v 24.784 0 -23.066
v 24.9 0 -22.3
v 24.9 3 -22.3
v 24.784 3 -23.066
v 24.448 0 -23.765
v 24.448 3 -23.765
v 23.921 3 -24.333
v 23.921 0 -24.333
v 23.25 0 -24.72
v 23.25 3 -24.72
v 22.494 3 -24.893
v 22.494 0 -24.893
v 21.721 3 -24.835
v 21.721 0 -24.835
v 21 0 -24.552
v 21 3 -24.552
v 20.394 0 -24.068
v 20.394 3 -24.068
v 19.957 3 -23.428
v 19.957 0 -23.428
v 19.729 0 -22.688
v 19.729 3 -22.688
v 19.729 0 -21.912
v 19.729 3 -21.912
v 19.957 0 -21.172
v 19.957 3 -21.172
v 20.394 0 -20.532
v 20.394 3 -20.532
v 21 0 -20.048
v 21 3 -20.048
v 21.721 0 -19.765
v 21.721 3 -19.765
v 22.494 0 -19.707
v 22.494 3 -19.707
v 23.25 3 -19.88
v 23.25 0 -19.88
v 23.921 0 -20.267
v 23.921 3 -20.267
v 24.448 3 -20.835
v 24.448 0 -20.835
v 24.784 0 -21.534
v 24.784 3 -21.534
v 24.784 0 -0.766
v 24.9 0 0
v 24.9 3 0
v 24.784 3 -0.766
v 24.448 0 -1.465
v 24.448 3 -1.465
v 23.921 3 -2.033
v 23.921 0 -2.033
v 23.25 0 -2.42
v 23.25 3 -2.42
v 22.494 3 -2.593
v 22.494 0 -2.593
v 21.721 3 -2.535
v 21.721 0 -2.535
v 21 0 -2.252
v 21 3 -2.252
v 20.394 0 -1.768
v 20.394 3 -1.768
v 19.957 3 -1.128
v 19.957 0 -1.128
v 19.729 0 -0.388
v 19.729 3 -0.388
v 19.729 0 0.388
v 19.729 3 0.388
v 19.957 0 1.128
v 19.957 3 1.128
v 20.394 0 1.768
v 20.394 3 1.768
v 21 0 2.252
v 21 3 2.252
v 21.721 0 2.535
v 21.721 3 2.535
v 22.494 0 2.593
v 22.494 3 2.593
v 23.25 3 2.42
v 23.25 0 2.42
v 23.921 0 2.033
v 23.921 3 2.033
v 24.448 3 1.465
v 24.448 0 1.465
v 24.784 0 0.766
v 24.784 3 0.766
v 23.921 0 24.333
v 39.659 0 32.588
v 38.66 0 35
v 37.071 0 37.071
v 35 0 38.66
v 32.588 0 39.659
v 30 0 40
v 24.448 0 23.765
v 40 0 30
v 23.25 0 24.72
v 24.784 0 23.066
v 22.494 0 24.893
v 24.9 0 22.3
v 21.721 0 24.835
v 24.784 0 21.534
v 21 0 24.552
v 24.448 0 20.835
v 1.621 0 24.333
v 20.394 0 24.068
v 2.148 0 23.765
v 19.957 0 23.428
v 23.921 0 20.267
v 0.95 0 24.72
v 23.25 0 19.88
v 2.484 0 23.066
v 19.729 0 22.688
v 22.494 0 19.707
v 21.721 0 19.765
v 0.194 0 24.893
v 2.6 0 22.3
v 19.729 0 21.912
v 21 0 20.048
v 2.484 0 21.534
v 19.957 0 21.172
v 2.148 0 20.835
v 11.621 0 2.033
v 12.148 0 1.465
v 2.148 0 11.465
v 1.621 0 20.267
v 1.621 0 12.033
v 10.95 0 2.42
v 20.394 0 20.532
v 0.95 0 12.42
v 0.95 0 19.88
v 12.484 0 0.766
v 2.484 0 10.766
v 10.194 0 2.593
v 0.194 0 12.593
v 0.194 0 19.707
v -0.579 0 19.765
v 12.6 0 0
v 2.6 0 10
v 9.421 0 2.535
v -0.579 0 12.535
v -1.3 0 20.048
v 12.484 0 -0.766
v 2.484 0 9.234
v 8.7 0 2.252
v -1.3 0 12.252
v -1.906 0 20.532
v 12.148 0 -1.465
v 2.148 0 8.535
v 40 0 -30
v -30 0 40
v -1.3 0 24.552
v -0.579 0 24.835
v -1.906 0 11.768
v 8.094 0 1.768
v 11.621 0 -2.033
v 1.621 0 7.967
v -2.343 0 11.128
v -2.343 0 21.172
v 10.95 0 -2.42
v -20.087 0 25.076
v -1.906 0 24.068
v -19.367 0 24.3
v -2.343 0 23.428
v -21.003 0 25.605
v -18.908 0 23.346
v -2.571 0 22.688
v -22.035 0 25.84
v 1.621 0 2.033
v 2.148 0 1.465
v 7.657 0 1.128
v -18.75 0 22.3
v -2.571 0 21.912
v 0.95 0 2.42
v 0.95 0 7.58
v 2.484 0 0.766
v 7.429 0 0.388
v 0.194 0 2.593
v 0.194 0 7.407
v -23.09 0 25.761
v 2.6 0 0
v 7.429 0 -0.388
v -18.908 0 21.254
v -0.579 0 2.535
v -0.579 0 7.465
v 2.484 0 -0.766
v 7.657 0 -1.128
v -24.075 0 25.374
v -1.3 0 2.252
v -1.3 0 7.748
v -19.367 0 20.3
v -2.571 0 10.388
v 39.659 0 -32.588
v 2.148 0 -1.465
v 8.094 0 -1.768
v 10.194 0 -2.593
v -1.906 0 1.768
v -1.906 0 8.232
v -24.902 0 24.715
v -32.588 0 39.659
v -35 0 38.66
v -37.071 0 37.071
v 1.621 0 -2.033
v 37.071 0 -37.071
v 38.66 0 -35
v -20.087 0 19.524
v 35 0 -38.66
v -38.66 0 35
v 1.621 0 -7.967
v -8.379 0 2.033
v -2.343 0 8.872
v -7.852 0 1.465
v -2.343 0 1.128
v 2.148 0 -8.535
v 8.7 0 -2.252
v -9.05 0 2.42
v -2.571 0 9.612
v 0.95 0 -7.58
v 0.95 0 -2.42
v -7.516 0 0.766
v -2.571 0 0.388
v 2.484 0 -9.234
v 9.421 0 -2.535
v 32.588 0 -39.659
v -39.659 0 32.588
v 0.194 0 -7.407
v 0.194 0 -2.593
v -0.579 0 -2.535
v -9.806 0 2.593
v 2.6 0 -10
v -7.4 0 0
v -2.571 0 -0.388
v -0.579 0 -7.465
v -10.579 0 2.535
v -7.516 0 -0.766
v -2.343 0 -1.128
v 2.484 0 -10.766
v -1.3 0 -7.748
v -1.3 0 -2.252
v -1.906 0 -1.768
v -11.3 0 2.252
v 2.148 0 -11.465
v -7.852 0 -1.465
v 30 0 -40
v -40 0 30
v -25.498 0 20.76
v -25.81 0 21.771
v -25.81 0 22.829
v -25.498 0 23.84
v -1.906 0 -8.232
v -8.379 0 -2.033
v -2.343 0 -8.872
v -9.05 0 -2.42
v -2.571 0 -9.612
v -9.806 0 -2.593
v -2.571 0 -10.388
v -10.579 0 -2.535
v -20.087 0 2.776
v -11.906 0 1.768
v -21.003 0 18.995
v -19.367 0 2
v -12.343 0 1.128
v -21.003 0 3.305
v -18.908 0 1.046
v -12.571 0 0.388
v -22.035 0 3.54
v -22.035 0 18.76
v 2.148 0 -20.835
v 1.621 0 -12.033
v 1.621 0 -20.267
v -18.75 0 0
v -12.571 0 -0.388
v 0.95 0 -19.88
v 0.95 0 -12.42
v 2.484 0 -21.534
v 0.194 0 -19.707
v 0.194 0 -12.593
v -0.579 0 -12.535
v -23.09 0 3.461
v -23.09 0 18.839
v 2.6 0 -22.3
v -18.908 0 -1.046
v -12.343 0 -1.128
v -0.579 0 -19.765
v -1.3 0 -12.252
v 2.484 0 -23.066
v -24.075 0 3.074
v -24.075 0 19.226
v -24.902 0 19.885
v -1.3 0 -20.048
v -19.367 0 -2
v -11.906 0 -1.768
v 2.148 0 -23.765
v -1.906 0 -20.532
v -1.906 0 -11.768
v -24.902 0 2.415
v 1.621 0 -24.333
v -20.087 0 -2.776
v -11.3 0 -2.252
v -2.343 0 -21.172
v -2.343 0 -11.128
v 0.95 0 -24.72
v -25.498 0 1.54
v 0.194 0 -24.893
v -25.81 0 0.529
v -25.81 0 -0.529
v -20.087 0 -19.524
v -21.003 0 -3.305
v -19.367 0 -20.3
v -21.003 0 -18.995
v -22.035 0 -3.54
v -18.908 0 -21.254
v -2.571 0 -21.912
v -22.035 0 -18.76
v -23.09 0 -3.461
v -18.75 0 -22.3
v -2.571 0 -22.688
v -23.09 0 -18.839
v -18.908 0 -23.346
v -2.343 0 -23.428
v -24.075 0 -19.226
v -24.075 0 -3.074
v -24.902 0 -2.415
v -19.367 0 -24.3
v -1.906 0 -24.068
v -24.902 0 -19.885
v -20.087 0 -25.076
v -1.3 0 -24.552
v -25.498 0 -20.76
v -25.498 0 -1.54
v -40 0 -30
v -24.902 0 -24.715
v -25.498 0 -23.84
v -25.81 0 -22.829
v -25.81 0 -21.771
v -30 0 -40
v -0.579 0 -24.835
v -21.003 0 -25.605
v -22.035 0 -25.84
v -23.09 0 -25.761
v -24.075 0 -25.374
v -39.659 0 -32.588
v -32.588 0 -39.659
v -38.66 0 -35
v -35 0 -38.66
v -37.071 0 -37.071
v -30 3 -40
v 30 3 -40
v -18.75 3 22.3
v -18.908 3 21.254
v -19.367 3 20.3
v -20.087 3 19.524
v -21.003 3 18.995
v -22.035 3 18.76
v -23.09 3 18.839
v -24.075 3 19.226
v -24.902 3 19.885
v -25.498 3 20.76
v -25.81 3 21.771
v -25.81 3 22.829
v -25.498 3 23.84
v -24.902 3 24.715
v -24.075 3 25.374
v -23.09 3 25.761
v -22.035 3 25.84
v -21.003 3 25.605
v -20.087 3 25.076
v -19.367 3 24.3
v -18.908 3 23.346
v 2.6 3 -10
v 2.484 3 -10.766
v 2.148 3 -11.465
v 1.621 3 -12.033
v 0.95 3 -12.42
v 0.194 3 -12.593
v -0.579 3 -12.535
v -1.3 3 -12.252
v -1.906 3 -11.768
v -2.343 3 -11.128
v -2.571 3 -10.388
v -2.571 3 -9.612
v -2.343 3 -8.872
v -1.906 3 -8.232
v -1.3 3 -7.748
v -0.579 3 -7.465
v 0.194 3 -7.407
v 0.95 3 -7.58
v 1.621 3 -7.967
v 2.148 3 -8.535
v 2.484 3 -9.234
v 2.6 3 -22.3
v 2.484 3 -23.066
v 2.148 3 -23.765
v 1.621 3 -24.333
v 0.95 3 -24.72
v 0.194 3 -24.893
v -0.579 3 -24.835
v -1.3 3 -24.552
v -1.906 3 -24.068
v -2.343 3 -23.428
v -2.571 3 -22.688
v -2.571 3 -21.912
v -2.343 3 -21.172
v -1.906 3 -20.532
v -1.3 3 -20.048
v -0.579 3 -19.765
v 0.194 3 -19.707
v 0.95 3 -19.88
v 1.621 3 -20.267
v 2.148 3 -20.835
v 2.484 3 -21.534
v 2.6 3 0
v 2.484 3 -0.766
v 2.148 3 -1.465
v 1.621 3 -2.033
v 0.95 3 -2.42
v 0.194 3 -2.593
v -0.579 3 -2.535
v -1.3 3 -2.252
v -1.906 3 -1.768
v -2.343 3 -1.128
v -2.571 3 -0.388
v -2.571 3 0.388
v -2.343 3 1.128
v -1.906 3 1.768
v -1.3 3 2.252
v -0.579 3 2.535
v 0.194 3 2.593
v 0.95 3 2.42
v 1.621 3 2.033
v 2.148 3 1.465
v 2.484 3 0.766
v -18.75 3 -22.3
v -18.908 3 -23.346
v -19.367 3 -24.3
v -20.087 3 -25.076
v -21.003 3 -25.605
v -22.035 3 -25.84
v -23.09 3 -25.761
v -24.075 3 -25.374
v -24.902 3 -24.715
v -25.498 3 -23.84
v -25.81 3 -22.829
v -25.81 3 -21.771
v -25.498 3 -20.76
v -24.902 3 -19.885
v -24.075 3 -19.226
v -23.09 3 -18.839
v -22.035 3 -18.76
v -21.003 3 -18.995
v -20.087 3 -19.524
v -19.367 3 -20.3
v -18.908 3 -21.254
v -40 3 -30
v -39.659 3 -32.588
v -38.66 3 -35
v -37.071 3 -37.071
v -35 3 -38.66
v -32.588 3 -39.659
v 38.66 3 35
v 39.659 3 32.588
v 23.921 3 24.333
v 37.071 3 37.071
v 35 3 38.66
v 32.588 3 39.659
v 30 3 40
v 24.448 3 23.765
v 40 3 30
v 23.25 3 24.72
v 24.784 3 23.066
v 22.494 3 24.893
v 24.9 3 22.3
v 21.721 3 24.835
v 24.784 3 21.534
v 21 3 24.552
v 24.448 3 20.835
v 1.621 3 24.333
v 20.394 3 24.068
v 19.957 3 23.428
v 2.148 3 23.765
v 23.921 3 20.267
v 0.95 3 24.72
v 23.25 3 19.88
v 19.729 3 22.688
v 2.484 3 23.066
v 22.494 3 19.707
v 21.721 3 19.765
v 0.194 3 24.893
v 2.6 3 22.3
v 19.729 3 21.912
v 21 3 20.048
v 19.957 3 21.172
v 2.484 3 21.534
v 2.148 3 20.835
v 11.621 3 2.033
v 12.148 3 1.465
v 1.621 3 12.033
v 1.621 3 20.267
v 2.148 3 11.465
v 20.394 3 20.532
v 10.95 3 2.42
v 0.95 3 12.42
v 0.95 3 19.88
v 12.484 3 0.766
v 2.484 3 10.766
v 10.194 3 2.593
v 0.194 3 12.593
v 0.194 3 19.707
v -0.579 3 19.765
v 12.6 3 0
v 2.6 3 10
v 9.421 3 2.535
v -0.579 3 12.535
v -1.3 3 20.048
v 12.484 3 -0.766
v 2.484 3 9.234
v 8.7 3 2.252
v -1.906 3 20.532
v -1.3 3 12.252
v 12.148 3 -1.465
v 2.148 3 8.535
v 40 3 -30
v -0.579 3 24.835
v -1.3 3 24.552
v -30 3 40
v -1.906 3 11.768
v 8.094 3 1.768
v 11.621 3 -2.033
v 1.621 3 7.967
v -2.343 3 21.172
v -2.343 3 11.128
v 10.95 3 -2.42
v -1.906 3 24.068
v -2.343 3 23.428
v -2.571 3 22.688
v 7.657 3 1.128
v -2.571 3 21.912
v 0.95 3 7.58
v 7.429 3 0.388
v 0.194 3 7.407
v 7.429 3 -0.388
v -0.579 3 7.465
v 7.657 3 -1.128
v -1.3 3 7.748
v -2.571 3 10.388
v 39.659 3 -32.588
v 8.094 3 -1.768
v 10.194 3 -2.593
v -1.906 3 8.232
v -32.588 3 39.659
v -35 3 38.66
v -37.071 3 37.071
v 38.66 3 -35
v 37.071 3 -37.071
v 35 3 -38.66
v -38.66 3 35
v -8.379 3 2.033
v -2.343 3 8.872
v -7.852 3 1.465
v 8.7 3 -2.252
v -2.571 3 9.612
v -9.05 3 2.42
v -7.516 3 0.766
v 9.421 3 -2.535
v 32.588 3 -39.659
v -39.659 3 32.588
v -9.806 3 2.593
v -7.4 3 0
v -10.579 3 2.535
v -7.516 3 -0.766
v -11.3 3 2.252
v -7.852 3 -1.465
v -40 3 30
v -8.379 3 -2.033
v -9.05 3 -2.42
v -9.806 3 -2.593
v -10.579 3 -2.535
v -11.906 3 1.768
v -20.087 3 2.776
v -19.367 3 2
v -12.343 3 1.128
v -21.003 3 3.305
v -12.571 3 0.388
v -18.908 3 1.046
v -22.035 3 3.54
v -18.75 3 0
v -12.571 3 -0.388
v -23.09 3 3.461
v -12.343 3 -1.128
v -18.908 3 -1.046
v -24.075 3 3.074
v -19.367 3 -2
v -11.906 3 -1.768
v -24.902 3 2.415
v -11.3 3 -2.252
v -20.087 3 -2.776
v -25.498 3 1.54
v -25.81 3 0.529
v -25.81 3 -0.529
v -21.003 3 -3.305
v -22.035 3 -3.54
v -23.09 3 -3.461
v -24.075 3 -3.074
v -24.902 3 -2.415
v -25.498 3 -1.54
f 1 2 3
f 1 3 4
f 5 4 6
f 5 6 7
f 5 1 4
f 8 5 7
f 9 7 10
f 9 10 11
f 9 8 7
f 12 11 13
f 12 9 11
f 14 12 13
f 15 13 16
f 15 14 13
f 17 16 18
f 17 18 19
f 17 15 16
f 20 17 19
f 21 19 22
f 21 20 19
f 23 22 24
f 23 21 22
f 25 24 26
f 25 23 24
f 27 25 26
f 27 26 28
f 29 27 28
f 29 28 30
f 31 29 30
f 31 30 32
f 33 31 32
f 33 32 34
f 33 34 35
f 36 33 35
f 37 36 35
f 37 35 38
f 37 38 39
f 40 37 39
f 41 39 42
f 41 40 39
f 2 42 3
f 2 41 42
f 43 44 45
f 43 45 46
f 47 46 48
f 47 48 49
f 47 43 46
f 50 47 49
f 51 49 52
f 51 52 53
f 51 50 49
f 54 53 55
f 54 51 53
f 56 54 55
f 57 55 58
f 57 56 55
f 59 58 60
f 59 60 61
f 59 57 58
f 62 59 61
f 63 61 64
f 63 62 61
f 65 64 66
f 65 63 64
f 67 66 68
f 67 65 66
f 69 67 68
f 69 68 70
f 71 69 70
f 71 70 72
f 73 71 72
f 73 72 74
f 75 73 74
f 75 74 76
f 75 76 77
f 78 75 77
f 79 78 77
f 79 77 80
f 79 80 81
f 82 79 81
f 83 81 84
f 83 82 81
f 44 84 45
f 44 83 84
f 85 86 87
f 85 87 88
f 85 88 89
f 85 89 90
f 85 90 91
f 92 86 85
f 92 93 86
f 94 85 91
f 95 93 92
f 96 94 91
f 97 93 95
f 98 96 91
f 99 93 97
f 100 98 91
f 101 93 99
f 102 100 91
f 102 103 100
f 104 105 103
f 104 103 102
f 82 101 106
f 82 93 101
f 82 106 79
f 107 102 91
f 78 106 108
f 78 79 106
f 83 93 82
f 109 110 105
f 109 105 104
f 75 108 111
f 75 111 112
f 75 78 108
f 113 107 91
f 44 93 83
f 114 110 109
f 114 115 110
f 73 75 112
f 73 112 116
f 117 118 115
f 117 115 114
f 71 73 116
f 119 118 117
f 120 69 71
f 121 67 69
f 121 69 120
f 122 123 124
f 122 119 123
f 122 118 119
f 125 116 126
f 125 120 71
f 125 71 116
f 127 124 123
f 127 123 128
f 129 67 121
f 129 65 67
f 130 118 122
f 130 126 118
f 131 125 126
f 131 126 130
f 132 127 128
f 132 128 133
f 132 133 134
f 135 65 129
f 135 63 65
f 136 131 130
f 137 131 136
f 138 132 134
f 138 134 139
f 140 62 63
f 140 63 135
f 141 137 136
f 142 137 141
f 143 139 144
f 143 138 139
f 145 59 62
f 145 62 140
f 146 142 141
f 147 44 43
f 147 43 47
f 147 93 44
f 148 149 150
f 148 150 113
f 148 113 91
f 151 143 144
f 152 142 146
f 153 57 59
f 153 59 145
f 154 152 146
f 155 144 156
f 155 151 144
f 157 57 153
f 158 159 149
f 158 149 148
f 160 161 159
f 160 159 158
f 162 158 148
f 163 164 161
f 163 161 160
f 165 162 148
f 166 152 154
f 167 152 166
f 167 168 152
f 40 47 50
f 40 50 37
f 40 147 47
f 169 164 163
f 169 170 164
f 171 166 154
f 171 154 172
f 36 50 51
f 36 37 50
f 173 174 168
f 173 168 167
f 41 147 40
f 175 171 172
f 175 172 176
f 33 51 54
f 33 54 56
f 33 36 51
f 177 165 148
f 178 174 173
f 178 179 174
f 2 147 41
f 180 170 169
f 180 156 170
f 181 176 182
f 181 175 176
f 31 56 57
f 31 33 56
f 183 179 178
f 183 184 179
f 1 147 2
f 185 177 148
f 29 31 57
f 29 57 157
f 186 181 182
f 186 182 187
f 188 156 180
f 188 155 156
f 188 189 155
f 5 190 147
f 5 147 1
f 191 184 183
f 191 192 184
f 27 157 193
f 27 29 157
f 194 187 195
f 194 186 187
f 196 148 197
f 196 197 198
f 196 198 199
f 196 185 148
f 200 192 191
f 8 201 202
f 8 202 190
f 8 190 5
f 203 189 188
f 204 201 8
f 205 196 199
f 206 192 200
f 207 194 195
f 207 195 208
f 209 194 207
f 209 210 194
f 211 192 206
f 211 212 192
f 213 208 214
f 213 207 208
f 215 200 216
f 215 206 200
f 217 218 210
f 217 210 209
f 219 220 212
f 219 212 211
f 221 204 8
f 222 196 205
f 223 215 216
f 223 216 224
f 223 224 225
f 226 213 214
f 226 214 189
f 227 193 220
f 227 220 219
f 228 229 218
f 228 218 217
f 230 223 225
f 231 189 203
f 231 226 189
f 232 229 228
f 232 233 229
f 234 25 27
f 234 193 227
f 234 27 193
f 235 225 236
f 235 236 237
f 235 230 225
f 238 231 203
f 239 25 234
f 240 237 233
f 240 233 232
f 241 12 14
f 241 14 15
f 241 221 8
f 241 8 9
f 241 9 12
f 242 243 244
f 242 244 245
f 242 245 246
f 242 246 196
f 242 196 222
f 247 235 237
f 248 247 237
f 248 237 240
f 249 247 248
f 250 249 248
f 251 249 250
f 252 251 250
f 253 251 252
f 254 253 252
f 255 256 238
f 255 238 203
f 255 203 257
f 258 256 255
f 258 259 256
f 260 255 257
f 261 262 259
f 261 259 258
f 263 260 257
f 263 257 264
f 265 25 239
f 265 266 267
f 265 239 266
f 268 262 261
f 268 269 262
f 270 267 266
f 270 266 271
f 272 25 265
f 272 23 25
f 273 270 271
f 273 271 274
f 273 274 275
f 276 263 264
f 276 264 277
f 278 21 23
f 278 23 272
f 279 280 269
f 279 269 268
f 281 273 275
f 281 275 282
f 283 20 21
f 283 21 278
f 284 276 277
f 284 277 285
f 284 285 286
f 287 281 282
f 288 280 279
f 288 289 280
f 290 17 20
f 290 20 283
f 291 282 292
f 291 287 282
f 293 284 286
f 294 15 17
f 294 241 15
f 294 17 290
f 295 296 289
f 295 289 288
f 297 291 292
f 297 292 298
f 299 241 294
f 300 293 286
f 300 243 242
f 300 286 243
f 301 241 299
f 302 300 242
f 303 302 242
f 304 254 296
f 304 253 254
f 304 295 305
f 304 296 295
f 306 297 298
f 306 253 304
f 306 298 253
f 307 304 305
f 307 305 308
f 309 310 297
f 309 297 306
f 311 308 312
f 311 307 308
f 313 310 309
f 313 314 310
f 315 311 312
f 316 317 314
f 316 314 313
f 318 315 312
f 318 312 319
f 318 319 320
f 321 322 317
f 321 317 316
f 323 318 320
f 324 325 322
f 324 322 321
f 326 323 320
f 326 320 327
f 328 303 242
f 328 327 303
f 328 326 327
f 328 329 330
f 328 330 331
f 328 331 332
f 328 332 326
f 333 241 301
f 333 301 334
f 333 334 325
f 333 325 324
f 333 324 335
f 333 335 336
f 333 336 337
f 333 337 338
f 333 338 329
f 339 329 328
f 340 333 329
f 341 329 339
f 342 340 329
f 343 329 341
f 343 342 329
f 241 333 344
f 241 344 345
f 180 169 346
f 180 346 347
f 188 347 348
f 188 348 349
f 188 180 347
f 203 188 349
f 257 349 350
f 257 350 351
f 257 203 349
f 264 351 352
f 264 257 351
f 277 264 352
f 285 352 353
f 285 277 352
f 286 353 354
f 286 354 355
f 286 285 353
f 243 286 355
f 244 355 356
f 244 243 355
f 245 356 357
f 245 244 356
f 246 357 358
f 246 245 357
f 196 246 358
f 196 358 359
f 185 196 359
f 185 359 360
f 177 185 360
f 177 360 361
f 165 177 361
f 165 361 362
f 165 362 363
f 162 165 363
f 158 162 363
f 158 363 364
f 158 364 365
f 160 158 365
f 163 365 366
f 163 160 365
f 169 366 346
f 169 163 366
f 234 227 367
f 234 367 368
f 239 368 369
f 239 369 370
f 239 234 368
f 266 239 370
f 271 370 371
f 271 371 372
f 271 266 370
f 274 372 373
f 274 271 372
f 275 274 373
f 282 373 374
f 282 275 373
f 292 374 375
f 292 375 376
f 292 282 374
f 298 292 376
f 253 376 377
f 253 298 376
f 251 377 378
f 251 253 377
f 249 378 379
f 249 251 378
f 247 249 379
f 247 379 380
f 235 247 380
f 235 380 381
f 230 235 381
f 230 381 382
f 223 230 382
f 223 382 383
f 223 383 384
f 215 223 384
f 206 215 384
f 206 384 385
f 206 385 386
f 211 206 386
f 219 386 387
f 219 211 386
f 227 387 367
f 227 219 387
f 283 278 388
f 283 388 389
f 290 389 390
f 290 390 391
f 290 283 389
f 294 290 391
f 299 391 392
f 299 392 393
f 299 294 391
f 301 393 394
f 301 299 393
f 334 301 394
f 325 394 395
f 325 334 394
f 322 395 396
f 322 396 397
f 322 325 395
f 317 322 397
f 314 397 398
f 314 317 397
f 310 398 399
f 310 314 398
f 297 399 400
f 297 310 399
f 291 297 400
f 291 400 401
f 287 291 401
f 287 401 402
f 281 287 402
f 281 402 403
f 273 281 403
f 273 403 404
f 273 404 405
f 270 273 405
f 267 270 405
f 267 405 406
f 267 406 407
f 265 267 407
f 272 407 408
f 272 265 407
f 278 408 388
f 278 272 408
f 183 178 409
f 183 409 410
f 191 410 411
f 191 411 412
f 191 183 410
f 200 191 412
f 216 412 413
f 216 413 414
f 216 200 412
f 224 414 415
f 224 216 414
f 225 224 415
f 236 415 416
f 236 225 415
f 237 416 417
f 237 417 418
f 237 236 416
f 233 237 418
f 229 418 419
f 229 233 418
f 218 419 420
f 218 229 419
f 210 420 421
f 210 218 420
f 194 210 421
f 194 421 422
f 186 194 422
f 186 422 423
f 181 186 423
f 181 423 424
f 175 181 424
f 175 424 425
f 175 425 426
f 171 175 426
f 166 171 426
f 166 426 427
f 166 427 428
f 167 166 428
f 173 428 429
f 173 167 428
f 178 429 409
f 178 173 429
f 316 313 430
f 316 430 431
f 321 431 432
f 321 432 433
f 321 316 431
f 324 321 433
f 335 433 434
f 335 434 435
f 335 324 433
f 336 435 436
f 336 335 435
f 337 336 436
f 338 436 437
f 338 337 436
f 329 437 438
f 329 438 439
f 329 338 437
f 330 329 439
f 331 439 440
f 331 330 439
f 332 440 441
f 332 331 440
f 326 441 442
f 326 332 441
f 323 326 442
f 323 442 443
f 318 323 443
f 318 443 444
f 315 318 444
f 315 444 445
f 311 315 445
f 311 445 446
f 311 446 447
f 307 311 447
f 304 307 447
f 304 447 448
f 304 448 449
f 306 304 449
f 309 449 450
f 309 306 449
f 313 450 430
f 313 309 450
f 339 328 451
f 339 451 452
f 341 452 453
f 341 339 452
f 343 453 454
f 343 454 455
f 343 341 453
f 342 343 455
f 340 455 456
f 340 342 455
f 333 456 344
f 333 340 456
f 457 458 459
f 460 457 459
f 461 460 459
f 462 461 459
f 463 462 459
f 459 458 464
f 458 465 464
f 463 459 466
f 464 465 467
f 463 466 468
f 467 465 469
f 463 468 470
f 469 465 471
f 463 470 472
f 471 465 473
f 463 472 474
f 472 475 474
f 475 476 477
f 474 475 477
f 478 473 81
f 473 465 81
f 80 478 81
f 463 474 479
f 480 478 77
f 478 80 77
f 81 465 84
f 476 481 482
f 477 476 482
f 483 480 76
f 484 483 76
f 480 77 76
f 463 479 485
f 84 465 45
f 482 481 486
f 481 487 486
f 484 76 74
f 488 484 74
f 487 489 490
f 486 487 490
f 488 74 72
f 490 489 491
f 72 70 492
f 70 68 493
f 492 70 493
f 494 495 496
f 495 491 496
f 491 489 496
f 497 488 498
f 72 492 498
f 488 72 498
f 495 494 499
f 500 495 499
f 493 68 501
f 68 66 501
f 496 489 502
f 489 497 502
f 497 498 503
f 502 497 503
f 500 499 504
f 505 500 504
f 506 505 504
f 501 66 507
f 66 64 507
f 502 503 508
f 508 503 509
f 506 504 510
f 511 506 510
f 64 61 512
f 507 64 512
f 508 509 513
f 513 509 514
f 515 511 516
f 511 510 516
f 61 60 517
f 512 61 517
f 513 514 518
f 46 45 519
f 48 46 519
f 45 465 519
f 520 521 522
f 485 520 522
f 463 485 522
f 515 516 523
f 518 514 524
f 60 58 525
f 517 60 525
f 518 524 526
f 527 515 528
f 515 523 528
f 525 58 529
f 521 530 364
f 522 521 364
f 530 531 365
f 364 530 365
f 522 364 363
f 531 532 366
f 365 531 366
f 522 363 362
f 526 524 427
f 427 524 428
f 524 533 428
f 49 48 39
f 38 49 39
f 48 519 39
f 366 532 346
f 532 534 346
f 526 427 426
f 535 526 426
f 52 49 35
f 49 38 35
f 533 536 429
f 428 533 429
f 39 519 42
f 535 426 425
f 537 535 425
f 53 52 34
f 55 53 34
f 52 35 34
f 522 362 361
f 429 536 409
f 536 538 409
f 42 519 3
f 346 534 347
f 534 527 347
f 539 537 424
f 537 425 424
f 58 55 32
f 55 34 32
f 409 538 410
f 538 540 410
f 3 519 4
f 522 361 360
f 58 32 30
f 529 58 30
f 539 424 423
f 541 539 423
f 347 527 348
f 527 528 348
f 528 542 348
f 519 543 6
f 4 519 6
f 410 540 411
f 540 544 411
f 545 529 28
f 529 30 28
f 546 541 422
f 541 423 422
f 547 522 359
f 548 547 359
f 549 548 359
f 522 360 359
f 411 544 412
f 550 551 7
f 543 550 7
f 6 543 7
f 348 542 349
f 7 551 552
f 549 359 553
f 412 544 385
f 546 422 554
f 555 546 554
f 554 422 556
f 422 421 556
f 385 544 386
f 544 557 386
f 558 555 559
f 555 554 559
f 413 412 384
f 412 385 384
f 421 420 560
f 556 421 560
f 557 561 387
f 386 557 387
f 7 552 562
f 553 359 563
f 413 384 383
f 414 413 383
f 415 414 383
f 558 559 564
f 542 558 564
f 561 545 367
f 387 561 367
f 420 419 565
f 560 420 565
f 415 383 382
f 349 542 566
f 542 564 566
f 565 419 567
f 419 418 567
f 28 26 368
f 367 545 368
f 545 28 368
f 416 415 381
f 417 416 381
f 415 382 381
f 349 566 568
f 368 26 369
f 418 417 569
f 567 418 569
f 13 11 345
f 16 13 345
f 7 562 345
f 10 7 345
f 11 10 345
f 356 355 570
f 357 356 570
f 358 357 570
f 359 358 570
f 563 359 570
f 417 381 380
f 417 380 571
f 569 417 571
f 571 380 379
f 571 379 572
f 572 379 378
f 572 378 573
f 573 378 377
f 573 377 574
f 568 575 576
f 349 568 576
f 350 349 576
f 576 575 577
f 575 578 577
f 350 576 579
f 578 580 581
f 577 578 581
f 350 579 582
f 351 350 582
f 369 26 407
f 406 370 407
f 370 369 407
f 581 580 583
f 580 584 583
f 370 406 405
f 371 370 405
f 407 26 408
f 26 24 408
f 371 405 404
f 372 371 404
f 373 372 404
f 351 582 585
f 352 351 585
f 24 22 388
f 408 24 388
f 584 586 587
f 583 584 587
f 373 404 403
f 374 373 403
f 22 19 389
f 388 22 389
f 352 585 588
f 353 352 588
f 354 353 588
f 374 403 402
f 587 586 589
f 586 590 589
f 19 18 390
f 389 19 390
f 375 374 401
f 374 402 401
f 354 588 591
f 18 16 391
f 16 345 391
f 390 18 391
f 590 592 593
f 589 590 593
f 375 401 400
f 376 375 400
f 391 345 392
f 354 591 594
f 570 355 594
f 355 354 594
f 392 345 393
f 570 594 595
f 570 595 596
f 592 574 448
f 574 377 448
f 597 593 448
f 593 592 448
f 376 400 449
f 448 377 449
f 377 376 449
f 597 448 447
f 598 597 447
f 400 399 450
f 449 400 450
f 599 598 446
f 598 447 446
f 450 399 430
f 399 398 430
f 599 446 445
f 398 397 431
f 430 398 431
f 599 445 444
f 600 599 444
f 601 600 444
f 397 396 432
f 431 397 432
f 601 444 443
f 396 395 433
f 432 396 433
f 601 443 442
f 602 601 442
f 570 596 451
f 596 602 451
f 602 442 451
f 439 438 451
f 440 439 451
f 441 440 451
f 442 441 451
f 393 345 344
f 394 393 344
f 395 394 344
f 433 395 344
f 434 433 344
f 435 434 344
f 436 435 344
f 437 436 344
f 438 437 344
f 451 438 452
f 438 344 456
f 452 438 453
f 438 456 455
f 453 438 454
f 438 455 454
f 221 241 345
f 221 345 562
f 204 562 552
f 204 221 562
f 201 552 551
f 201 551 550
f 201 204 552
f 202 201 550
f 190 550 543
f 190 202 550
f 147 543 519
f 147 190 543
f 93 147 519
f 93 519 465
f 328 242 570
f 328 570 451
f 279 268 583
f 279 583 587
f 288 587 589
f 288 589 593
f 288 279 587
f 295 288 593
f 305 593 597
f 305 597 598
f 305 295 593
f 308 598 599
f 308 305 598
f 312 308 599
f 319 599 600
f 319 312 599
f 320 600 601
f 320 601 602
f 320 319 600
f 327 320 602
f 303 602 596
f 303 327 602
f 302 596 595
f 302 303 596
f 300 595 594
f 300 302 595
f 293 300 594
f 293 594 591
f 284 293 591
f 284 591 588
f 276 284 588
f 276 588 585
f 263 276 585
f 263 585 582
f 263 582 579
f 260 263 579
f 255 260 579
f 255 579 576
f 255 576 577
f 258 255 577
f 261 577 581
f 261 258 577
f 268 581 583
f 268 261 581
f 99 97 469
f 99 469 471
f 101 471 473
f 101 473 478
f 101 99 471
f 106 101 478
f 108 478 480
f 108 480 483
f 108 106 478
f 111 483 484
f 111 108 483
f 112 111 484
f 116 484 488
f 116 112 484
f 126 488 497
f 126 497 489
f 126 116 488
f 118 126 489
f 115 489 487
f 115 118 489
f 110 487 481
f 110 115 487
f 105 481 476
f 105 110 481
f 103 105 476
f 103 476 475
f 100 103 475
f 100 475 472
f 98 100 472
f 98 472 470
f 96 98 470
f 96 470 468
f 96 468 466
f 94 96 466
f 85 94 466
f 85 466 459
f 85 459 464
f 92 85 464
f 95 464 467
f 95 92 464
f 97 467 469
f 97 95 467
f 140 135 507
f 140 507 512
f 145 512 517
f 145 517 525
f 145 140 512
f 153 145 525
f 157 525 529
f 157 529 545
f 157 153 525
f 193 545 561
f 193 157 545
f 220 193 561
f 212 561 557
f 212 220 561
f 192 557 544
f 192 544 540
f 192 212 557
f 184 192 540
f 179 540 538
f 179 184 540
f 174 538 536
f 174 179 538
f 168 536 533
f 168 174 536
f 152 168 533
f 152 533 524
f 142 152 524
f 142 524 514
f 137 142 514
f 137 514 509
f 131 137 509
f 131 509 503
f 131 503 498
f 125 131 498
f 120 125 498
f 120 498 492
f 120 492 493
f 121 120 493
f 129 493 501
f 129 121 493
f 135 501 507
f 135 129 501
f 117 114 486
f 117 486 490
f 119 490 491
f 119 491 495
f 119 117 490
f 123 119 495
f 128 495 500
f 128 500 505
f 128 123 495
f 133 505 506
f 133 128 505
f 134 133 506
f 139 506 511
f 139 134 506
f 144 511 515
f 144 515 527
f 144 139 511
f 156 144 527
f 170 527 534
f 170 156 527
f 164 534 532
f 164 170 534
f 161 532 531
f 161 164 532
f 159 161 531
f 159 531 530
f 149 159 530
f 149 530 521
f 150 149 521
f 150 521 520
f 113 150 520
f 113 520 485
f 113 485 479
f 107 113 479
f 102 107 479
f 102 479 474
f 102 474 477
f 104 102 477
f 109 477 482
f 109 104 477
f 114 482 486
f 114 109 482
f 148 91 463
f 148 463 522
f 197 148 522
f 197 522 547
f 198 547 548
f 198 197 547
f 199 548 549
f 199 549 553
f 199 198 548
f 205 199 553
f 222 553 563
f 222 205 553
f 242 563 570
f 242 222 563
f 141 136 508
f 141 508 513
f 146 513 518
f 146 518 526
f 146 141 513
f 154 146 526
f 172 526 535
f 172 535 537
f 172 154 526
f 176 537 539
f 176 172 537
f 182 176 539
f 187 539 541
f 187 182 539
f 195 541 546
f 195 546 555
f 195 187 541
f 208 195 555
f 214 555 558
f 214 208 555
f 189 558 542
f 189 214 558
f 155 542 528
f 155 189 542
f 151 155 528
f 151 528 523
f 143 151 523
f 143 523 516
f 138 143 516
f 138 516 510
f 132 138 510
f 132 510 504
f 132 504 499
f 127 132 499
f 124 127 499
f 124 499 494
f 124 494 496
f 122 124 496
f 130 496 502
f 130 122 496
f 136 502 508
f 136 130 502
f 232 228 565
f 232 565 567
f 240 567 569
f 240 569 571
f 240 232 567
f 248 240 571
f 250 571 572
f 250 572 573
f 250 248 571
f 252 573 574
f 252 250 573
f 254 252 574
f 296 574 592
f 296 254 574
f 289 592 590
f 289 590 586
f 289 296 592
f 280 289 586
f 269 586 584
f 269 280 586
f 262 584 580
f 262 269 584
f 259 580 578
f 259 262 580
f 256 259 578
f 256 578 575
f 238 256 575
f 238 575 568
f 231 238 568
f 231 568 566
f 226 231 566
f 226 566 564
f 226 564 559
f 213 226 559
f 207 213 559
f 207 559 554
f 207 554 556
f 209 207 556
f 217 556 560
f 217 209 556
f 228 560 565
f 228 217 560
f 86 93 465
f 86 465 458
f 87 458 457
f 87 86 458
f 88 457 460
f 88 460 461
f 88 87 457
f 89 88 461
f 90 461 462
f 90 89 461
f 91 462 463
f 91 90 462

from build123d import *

# Parameters (mm, degrees)
SKETCH1_R           = 2.6
SKETCH1_R_2         = 3.55
BOSS_EXTRUDE1_DEPTH = 3


with BuildPart() as part:
    # Sketch1 → Boss-Extrude1 (new body)
    with BuildSketch(Plane(origin=(0, 0, 0), x_dir=(1, 0, 0), z_dir=(0, 1, 0))):
        with BuildLine():
            Line((30, -40), (-30, -40))
            ThreePointArc((-30, -40), (-37.071067812, -37.071067812), (-40, -30))
            Line((-40, -30), (-40, 30))
            ThreePointArc((-40, 30), (-37.071067812, 37.071067812), (-30, 40))
            Line((-30, 40), (30, 40))
            ThreePointArc((30, 40), (37.071067812, 37.071067812), (40, 30))
            Line((40, 30), (40, -30))
            ThreePointArc((40, -30), (37.071067812, -37.071067812), (30, -40))
        make_face()
        Circle(SKETCH1_R, mode=Mode.SUBTRACT)
        with Locations((0, -10)):
            Circle(SKETCH1_R, mode=Mode.SUBTRACT)
        with Locations((-10, 0)):
            Circle(SKETCH1_R, mode=Mode.SUBTRACT)
        with Locations((10, 0)):
            Circle(SKETCH1_R, mode=Mode.SUBTRACT)
        with Locations((0, 10)):
            Circle(SKETCH1_R, mode=Mode.SUBTRACT)
        with Locations((-22.3, 22.3)):
            Circle(SKETCH1_R_2, mode=Mode.SUBTRACT)
        with Locations((-22.3, 0)):
            Circle(SKETCH1_R_2, mode=Mode.SUBTRACT)
        with Locations((-22.3, -22.3)):
            Circle(SKETCH1_R_2, mode=Mode.SUBTRACT)
        with Locations((0, 22.3)):
            Circle(SKETCH1_R, mode=Mode.SUBTRACT)
        with Locations((0, -22.3)):
            Circle(SKETCH1_R, mode=Mode.SUBTRACT)
        with Locations((22.3, 22.3)):
            Circle(SKETCH1_R, mode=Mode.SUBTRACT)
        with Locations((22.3, 0)):
            Circle(SKETCH1_R, mode=Mode.SUBTRACT)
        with Locations((22.3, -22.3)):
            Circle(SKETCH1_R, mode=Mode.SUBTRACT)
    extrude(amount=BOSS_EXTRUDE1_DEPTH)


solid = part.part
